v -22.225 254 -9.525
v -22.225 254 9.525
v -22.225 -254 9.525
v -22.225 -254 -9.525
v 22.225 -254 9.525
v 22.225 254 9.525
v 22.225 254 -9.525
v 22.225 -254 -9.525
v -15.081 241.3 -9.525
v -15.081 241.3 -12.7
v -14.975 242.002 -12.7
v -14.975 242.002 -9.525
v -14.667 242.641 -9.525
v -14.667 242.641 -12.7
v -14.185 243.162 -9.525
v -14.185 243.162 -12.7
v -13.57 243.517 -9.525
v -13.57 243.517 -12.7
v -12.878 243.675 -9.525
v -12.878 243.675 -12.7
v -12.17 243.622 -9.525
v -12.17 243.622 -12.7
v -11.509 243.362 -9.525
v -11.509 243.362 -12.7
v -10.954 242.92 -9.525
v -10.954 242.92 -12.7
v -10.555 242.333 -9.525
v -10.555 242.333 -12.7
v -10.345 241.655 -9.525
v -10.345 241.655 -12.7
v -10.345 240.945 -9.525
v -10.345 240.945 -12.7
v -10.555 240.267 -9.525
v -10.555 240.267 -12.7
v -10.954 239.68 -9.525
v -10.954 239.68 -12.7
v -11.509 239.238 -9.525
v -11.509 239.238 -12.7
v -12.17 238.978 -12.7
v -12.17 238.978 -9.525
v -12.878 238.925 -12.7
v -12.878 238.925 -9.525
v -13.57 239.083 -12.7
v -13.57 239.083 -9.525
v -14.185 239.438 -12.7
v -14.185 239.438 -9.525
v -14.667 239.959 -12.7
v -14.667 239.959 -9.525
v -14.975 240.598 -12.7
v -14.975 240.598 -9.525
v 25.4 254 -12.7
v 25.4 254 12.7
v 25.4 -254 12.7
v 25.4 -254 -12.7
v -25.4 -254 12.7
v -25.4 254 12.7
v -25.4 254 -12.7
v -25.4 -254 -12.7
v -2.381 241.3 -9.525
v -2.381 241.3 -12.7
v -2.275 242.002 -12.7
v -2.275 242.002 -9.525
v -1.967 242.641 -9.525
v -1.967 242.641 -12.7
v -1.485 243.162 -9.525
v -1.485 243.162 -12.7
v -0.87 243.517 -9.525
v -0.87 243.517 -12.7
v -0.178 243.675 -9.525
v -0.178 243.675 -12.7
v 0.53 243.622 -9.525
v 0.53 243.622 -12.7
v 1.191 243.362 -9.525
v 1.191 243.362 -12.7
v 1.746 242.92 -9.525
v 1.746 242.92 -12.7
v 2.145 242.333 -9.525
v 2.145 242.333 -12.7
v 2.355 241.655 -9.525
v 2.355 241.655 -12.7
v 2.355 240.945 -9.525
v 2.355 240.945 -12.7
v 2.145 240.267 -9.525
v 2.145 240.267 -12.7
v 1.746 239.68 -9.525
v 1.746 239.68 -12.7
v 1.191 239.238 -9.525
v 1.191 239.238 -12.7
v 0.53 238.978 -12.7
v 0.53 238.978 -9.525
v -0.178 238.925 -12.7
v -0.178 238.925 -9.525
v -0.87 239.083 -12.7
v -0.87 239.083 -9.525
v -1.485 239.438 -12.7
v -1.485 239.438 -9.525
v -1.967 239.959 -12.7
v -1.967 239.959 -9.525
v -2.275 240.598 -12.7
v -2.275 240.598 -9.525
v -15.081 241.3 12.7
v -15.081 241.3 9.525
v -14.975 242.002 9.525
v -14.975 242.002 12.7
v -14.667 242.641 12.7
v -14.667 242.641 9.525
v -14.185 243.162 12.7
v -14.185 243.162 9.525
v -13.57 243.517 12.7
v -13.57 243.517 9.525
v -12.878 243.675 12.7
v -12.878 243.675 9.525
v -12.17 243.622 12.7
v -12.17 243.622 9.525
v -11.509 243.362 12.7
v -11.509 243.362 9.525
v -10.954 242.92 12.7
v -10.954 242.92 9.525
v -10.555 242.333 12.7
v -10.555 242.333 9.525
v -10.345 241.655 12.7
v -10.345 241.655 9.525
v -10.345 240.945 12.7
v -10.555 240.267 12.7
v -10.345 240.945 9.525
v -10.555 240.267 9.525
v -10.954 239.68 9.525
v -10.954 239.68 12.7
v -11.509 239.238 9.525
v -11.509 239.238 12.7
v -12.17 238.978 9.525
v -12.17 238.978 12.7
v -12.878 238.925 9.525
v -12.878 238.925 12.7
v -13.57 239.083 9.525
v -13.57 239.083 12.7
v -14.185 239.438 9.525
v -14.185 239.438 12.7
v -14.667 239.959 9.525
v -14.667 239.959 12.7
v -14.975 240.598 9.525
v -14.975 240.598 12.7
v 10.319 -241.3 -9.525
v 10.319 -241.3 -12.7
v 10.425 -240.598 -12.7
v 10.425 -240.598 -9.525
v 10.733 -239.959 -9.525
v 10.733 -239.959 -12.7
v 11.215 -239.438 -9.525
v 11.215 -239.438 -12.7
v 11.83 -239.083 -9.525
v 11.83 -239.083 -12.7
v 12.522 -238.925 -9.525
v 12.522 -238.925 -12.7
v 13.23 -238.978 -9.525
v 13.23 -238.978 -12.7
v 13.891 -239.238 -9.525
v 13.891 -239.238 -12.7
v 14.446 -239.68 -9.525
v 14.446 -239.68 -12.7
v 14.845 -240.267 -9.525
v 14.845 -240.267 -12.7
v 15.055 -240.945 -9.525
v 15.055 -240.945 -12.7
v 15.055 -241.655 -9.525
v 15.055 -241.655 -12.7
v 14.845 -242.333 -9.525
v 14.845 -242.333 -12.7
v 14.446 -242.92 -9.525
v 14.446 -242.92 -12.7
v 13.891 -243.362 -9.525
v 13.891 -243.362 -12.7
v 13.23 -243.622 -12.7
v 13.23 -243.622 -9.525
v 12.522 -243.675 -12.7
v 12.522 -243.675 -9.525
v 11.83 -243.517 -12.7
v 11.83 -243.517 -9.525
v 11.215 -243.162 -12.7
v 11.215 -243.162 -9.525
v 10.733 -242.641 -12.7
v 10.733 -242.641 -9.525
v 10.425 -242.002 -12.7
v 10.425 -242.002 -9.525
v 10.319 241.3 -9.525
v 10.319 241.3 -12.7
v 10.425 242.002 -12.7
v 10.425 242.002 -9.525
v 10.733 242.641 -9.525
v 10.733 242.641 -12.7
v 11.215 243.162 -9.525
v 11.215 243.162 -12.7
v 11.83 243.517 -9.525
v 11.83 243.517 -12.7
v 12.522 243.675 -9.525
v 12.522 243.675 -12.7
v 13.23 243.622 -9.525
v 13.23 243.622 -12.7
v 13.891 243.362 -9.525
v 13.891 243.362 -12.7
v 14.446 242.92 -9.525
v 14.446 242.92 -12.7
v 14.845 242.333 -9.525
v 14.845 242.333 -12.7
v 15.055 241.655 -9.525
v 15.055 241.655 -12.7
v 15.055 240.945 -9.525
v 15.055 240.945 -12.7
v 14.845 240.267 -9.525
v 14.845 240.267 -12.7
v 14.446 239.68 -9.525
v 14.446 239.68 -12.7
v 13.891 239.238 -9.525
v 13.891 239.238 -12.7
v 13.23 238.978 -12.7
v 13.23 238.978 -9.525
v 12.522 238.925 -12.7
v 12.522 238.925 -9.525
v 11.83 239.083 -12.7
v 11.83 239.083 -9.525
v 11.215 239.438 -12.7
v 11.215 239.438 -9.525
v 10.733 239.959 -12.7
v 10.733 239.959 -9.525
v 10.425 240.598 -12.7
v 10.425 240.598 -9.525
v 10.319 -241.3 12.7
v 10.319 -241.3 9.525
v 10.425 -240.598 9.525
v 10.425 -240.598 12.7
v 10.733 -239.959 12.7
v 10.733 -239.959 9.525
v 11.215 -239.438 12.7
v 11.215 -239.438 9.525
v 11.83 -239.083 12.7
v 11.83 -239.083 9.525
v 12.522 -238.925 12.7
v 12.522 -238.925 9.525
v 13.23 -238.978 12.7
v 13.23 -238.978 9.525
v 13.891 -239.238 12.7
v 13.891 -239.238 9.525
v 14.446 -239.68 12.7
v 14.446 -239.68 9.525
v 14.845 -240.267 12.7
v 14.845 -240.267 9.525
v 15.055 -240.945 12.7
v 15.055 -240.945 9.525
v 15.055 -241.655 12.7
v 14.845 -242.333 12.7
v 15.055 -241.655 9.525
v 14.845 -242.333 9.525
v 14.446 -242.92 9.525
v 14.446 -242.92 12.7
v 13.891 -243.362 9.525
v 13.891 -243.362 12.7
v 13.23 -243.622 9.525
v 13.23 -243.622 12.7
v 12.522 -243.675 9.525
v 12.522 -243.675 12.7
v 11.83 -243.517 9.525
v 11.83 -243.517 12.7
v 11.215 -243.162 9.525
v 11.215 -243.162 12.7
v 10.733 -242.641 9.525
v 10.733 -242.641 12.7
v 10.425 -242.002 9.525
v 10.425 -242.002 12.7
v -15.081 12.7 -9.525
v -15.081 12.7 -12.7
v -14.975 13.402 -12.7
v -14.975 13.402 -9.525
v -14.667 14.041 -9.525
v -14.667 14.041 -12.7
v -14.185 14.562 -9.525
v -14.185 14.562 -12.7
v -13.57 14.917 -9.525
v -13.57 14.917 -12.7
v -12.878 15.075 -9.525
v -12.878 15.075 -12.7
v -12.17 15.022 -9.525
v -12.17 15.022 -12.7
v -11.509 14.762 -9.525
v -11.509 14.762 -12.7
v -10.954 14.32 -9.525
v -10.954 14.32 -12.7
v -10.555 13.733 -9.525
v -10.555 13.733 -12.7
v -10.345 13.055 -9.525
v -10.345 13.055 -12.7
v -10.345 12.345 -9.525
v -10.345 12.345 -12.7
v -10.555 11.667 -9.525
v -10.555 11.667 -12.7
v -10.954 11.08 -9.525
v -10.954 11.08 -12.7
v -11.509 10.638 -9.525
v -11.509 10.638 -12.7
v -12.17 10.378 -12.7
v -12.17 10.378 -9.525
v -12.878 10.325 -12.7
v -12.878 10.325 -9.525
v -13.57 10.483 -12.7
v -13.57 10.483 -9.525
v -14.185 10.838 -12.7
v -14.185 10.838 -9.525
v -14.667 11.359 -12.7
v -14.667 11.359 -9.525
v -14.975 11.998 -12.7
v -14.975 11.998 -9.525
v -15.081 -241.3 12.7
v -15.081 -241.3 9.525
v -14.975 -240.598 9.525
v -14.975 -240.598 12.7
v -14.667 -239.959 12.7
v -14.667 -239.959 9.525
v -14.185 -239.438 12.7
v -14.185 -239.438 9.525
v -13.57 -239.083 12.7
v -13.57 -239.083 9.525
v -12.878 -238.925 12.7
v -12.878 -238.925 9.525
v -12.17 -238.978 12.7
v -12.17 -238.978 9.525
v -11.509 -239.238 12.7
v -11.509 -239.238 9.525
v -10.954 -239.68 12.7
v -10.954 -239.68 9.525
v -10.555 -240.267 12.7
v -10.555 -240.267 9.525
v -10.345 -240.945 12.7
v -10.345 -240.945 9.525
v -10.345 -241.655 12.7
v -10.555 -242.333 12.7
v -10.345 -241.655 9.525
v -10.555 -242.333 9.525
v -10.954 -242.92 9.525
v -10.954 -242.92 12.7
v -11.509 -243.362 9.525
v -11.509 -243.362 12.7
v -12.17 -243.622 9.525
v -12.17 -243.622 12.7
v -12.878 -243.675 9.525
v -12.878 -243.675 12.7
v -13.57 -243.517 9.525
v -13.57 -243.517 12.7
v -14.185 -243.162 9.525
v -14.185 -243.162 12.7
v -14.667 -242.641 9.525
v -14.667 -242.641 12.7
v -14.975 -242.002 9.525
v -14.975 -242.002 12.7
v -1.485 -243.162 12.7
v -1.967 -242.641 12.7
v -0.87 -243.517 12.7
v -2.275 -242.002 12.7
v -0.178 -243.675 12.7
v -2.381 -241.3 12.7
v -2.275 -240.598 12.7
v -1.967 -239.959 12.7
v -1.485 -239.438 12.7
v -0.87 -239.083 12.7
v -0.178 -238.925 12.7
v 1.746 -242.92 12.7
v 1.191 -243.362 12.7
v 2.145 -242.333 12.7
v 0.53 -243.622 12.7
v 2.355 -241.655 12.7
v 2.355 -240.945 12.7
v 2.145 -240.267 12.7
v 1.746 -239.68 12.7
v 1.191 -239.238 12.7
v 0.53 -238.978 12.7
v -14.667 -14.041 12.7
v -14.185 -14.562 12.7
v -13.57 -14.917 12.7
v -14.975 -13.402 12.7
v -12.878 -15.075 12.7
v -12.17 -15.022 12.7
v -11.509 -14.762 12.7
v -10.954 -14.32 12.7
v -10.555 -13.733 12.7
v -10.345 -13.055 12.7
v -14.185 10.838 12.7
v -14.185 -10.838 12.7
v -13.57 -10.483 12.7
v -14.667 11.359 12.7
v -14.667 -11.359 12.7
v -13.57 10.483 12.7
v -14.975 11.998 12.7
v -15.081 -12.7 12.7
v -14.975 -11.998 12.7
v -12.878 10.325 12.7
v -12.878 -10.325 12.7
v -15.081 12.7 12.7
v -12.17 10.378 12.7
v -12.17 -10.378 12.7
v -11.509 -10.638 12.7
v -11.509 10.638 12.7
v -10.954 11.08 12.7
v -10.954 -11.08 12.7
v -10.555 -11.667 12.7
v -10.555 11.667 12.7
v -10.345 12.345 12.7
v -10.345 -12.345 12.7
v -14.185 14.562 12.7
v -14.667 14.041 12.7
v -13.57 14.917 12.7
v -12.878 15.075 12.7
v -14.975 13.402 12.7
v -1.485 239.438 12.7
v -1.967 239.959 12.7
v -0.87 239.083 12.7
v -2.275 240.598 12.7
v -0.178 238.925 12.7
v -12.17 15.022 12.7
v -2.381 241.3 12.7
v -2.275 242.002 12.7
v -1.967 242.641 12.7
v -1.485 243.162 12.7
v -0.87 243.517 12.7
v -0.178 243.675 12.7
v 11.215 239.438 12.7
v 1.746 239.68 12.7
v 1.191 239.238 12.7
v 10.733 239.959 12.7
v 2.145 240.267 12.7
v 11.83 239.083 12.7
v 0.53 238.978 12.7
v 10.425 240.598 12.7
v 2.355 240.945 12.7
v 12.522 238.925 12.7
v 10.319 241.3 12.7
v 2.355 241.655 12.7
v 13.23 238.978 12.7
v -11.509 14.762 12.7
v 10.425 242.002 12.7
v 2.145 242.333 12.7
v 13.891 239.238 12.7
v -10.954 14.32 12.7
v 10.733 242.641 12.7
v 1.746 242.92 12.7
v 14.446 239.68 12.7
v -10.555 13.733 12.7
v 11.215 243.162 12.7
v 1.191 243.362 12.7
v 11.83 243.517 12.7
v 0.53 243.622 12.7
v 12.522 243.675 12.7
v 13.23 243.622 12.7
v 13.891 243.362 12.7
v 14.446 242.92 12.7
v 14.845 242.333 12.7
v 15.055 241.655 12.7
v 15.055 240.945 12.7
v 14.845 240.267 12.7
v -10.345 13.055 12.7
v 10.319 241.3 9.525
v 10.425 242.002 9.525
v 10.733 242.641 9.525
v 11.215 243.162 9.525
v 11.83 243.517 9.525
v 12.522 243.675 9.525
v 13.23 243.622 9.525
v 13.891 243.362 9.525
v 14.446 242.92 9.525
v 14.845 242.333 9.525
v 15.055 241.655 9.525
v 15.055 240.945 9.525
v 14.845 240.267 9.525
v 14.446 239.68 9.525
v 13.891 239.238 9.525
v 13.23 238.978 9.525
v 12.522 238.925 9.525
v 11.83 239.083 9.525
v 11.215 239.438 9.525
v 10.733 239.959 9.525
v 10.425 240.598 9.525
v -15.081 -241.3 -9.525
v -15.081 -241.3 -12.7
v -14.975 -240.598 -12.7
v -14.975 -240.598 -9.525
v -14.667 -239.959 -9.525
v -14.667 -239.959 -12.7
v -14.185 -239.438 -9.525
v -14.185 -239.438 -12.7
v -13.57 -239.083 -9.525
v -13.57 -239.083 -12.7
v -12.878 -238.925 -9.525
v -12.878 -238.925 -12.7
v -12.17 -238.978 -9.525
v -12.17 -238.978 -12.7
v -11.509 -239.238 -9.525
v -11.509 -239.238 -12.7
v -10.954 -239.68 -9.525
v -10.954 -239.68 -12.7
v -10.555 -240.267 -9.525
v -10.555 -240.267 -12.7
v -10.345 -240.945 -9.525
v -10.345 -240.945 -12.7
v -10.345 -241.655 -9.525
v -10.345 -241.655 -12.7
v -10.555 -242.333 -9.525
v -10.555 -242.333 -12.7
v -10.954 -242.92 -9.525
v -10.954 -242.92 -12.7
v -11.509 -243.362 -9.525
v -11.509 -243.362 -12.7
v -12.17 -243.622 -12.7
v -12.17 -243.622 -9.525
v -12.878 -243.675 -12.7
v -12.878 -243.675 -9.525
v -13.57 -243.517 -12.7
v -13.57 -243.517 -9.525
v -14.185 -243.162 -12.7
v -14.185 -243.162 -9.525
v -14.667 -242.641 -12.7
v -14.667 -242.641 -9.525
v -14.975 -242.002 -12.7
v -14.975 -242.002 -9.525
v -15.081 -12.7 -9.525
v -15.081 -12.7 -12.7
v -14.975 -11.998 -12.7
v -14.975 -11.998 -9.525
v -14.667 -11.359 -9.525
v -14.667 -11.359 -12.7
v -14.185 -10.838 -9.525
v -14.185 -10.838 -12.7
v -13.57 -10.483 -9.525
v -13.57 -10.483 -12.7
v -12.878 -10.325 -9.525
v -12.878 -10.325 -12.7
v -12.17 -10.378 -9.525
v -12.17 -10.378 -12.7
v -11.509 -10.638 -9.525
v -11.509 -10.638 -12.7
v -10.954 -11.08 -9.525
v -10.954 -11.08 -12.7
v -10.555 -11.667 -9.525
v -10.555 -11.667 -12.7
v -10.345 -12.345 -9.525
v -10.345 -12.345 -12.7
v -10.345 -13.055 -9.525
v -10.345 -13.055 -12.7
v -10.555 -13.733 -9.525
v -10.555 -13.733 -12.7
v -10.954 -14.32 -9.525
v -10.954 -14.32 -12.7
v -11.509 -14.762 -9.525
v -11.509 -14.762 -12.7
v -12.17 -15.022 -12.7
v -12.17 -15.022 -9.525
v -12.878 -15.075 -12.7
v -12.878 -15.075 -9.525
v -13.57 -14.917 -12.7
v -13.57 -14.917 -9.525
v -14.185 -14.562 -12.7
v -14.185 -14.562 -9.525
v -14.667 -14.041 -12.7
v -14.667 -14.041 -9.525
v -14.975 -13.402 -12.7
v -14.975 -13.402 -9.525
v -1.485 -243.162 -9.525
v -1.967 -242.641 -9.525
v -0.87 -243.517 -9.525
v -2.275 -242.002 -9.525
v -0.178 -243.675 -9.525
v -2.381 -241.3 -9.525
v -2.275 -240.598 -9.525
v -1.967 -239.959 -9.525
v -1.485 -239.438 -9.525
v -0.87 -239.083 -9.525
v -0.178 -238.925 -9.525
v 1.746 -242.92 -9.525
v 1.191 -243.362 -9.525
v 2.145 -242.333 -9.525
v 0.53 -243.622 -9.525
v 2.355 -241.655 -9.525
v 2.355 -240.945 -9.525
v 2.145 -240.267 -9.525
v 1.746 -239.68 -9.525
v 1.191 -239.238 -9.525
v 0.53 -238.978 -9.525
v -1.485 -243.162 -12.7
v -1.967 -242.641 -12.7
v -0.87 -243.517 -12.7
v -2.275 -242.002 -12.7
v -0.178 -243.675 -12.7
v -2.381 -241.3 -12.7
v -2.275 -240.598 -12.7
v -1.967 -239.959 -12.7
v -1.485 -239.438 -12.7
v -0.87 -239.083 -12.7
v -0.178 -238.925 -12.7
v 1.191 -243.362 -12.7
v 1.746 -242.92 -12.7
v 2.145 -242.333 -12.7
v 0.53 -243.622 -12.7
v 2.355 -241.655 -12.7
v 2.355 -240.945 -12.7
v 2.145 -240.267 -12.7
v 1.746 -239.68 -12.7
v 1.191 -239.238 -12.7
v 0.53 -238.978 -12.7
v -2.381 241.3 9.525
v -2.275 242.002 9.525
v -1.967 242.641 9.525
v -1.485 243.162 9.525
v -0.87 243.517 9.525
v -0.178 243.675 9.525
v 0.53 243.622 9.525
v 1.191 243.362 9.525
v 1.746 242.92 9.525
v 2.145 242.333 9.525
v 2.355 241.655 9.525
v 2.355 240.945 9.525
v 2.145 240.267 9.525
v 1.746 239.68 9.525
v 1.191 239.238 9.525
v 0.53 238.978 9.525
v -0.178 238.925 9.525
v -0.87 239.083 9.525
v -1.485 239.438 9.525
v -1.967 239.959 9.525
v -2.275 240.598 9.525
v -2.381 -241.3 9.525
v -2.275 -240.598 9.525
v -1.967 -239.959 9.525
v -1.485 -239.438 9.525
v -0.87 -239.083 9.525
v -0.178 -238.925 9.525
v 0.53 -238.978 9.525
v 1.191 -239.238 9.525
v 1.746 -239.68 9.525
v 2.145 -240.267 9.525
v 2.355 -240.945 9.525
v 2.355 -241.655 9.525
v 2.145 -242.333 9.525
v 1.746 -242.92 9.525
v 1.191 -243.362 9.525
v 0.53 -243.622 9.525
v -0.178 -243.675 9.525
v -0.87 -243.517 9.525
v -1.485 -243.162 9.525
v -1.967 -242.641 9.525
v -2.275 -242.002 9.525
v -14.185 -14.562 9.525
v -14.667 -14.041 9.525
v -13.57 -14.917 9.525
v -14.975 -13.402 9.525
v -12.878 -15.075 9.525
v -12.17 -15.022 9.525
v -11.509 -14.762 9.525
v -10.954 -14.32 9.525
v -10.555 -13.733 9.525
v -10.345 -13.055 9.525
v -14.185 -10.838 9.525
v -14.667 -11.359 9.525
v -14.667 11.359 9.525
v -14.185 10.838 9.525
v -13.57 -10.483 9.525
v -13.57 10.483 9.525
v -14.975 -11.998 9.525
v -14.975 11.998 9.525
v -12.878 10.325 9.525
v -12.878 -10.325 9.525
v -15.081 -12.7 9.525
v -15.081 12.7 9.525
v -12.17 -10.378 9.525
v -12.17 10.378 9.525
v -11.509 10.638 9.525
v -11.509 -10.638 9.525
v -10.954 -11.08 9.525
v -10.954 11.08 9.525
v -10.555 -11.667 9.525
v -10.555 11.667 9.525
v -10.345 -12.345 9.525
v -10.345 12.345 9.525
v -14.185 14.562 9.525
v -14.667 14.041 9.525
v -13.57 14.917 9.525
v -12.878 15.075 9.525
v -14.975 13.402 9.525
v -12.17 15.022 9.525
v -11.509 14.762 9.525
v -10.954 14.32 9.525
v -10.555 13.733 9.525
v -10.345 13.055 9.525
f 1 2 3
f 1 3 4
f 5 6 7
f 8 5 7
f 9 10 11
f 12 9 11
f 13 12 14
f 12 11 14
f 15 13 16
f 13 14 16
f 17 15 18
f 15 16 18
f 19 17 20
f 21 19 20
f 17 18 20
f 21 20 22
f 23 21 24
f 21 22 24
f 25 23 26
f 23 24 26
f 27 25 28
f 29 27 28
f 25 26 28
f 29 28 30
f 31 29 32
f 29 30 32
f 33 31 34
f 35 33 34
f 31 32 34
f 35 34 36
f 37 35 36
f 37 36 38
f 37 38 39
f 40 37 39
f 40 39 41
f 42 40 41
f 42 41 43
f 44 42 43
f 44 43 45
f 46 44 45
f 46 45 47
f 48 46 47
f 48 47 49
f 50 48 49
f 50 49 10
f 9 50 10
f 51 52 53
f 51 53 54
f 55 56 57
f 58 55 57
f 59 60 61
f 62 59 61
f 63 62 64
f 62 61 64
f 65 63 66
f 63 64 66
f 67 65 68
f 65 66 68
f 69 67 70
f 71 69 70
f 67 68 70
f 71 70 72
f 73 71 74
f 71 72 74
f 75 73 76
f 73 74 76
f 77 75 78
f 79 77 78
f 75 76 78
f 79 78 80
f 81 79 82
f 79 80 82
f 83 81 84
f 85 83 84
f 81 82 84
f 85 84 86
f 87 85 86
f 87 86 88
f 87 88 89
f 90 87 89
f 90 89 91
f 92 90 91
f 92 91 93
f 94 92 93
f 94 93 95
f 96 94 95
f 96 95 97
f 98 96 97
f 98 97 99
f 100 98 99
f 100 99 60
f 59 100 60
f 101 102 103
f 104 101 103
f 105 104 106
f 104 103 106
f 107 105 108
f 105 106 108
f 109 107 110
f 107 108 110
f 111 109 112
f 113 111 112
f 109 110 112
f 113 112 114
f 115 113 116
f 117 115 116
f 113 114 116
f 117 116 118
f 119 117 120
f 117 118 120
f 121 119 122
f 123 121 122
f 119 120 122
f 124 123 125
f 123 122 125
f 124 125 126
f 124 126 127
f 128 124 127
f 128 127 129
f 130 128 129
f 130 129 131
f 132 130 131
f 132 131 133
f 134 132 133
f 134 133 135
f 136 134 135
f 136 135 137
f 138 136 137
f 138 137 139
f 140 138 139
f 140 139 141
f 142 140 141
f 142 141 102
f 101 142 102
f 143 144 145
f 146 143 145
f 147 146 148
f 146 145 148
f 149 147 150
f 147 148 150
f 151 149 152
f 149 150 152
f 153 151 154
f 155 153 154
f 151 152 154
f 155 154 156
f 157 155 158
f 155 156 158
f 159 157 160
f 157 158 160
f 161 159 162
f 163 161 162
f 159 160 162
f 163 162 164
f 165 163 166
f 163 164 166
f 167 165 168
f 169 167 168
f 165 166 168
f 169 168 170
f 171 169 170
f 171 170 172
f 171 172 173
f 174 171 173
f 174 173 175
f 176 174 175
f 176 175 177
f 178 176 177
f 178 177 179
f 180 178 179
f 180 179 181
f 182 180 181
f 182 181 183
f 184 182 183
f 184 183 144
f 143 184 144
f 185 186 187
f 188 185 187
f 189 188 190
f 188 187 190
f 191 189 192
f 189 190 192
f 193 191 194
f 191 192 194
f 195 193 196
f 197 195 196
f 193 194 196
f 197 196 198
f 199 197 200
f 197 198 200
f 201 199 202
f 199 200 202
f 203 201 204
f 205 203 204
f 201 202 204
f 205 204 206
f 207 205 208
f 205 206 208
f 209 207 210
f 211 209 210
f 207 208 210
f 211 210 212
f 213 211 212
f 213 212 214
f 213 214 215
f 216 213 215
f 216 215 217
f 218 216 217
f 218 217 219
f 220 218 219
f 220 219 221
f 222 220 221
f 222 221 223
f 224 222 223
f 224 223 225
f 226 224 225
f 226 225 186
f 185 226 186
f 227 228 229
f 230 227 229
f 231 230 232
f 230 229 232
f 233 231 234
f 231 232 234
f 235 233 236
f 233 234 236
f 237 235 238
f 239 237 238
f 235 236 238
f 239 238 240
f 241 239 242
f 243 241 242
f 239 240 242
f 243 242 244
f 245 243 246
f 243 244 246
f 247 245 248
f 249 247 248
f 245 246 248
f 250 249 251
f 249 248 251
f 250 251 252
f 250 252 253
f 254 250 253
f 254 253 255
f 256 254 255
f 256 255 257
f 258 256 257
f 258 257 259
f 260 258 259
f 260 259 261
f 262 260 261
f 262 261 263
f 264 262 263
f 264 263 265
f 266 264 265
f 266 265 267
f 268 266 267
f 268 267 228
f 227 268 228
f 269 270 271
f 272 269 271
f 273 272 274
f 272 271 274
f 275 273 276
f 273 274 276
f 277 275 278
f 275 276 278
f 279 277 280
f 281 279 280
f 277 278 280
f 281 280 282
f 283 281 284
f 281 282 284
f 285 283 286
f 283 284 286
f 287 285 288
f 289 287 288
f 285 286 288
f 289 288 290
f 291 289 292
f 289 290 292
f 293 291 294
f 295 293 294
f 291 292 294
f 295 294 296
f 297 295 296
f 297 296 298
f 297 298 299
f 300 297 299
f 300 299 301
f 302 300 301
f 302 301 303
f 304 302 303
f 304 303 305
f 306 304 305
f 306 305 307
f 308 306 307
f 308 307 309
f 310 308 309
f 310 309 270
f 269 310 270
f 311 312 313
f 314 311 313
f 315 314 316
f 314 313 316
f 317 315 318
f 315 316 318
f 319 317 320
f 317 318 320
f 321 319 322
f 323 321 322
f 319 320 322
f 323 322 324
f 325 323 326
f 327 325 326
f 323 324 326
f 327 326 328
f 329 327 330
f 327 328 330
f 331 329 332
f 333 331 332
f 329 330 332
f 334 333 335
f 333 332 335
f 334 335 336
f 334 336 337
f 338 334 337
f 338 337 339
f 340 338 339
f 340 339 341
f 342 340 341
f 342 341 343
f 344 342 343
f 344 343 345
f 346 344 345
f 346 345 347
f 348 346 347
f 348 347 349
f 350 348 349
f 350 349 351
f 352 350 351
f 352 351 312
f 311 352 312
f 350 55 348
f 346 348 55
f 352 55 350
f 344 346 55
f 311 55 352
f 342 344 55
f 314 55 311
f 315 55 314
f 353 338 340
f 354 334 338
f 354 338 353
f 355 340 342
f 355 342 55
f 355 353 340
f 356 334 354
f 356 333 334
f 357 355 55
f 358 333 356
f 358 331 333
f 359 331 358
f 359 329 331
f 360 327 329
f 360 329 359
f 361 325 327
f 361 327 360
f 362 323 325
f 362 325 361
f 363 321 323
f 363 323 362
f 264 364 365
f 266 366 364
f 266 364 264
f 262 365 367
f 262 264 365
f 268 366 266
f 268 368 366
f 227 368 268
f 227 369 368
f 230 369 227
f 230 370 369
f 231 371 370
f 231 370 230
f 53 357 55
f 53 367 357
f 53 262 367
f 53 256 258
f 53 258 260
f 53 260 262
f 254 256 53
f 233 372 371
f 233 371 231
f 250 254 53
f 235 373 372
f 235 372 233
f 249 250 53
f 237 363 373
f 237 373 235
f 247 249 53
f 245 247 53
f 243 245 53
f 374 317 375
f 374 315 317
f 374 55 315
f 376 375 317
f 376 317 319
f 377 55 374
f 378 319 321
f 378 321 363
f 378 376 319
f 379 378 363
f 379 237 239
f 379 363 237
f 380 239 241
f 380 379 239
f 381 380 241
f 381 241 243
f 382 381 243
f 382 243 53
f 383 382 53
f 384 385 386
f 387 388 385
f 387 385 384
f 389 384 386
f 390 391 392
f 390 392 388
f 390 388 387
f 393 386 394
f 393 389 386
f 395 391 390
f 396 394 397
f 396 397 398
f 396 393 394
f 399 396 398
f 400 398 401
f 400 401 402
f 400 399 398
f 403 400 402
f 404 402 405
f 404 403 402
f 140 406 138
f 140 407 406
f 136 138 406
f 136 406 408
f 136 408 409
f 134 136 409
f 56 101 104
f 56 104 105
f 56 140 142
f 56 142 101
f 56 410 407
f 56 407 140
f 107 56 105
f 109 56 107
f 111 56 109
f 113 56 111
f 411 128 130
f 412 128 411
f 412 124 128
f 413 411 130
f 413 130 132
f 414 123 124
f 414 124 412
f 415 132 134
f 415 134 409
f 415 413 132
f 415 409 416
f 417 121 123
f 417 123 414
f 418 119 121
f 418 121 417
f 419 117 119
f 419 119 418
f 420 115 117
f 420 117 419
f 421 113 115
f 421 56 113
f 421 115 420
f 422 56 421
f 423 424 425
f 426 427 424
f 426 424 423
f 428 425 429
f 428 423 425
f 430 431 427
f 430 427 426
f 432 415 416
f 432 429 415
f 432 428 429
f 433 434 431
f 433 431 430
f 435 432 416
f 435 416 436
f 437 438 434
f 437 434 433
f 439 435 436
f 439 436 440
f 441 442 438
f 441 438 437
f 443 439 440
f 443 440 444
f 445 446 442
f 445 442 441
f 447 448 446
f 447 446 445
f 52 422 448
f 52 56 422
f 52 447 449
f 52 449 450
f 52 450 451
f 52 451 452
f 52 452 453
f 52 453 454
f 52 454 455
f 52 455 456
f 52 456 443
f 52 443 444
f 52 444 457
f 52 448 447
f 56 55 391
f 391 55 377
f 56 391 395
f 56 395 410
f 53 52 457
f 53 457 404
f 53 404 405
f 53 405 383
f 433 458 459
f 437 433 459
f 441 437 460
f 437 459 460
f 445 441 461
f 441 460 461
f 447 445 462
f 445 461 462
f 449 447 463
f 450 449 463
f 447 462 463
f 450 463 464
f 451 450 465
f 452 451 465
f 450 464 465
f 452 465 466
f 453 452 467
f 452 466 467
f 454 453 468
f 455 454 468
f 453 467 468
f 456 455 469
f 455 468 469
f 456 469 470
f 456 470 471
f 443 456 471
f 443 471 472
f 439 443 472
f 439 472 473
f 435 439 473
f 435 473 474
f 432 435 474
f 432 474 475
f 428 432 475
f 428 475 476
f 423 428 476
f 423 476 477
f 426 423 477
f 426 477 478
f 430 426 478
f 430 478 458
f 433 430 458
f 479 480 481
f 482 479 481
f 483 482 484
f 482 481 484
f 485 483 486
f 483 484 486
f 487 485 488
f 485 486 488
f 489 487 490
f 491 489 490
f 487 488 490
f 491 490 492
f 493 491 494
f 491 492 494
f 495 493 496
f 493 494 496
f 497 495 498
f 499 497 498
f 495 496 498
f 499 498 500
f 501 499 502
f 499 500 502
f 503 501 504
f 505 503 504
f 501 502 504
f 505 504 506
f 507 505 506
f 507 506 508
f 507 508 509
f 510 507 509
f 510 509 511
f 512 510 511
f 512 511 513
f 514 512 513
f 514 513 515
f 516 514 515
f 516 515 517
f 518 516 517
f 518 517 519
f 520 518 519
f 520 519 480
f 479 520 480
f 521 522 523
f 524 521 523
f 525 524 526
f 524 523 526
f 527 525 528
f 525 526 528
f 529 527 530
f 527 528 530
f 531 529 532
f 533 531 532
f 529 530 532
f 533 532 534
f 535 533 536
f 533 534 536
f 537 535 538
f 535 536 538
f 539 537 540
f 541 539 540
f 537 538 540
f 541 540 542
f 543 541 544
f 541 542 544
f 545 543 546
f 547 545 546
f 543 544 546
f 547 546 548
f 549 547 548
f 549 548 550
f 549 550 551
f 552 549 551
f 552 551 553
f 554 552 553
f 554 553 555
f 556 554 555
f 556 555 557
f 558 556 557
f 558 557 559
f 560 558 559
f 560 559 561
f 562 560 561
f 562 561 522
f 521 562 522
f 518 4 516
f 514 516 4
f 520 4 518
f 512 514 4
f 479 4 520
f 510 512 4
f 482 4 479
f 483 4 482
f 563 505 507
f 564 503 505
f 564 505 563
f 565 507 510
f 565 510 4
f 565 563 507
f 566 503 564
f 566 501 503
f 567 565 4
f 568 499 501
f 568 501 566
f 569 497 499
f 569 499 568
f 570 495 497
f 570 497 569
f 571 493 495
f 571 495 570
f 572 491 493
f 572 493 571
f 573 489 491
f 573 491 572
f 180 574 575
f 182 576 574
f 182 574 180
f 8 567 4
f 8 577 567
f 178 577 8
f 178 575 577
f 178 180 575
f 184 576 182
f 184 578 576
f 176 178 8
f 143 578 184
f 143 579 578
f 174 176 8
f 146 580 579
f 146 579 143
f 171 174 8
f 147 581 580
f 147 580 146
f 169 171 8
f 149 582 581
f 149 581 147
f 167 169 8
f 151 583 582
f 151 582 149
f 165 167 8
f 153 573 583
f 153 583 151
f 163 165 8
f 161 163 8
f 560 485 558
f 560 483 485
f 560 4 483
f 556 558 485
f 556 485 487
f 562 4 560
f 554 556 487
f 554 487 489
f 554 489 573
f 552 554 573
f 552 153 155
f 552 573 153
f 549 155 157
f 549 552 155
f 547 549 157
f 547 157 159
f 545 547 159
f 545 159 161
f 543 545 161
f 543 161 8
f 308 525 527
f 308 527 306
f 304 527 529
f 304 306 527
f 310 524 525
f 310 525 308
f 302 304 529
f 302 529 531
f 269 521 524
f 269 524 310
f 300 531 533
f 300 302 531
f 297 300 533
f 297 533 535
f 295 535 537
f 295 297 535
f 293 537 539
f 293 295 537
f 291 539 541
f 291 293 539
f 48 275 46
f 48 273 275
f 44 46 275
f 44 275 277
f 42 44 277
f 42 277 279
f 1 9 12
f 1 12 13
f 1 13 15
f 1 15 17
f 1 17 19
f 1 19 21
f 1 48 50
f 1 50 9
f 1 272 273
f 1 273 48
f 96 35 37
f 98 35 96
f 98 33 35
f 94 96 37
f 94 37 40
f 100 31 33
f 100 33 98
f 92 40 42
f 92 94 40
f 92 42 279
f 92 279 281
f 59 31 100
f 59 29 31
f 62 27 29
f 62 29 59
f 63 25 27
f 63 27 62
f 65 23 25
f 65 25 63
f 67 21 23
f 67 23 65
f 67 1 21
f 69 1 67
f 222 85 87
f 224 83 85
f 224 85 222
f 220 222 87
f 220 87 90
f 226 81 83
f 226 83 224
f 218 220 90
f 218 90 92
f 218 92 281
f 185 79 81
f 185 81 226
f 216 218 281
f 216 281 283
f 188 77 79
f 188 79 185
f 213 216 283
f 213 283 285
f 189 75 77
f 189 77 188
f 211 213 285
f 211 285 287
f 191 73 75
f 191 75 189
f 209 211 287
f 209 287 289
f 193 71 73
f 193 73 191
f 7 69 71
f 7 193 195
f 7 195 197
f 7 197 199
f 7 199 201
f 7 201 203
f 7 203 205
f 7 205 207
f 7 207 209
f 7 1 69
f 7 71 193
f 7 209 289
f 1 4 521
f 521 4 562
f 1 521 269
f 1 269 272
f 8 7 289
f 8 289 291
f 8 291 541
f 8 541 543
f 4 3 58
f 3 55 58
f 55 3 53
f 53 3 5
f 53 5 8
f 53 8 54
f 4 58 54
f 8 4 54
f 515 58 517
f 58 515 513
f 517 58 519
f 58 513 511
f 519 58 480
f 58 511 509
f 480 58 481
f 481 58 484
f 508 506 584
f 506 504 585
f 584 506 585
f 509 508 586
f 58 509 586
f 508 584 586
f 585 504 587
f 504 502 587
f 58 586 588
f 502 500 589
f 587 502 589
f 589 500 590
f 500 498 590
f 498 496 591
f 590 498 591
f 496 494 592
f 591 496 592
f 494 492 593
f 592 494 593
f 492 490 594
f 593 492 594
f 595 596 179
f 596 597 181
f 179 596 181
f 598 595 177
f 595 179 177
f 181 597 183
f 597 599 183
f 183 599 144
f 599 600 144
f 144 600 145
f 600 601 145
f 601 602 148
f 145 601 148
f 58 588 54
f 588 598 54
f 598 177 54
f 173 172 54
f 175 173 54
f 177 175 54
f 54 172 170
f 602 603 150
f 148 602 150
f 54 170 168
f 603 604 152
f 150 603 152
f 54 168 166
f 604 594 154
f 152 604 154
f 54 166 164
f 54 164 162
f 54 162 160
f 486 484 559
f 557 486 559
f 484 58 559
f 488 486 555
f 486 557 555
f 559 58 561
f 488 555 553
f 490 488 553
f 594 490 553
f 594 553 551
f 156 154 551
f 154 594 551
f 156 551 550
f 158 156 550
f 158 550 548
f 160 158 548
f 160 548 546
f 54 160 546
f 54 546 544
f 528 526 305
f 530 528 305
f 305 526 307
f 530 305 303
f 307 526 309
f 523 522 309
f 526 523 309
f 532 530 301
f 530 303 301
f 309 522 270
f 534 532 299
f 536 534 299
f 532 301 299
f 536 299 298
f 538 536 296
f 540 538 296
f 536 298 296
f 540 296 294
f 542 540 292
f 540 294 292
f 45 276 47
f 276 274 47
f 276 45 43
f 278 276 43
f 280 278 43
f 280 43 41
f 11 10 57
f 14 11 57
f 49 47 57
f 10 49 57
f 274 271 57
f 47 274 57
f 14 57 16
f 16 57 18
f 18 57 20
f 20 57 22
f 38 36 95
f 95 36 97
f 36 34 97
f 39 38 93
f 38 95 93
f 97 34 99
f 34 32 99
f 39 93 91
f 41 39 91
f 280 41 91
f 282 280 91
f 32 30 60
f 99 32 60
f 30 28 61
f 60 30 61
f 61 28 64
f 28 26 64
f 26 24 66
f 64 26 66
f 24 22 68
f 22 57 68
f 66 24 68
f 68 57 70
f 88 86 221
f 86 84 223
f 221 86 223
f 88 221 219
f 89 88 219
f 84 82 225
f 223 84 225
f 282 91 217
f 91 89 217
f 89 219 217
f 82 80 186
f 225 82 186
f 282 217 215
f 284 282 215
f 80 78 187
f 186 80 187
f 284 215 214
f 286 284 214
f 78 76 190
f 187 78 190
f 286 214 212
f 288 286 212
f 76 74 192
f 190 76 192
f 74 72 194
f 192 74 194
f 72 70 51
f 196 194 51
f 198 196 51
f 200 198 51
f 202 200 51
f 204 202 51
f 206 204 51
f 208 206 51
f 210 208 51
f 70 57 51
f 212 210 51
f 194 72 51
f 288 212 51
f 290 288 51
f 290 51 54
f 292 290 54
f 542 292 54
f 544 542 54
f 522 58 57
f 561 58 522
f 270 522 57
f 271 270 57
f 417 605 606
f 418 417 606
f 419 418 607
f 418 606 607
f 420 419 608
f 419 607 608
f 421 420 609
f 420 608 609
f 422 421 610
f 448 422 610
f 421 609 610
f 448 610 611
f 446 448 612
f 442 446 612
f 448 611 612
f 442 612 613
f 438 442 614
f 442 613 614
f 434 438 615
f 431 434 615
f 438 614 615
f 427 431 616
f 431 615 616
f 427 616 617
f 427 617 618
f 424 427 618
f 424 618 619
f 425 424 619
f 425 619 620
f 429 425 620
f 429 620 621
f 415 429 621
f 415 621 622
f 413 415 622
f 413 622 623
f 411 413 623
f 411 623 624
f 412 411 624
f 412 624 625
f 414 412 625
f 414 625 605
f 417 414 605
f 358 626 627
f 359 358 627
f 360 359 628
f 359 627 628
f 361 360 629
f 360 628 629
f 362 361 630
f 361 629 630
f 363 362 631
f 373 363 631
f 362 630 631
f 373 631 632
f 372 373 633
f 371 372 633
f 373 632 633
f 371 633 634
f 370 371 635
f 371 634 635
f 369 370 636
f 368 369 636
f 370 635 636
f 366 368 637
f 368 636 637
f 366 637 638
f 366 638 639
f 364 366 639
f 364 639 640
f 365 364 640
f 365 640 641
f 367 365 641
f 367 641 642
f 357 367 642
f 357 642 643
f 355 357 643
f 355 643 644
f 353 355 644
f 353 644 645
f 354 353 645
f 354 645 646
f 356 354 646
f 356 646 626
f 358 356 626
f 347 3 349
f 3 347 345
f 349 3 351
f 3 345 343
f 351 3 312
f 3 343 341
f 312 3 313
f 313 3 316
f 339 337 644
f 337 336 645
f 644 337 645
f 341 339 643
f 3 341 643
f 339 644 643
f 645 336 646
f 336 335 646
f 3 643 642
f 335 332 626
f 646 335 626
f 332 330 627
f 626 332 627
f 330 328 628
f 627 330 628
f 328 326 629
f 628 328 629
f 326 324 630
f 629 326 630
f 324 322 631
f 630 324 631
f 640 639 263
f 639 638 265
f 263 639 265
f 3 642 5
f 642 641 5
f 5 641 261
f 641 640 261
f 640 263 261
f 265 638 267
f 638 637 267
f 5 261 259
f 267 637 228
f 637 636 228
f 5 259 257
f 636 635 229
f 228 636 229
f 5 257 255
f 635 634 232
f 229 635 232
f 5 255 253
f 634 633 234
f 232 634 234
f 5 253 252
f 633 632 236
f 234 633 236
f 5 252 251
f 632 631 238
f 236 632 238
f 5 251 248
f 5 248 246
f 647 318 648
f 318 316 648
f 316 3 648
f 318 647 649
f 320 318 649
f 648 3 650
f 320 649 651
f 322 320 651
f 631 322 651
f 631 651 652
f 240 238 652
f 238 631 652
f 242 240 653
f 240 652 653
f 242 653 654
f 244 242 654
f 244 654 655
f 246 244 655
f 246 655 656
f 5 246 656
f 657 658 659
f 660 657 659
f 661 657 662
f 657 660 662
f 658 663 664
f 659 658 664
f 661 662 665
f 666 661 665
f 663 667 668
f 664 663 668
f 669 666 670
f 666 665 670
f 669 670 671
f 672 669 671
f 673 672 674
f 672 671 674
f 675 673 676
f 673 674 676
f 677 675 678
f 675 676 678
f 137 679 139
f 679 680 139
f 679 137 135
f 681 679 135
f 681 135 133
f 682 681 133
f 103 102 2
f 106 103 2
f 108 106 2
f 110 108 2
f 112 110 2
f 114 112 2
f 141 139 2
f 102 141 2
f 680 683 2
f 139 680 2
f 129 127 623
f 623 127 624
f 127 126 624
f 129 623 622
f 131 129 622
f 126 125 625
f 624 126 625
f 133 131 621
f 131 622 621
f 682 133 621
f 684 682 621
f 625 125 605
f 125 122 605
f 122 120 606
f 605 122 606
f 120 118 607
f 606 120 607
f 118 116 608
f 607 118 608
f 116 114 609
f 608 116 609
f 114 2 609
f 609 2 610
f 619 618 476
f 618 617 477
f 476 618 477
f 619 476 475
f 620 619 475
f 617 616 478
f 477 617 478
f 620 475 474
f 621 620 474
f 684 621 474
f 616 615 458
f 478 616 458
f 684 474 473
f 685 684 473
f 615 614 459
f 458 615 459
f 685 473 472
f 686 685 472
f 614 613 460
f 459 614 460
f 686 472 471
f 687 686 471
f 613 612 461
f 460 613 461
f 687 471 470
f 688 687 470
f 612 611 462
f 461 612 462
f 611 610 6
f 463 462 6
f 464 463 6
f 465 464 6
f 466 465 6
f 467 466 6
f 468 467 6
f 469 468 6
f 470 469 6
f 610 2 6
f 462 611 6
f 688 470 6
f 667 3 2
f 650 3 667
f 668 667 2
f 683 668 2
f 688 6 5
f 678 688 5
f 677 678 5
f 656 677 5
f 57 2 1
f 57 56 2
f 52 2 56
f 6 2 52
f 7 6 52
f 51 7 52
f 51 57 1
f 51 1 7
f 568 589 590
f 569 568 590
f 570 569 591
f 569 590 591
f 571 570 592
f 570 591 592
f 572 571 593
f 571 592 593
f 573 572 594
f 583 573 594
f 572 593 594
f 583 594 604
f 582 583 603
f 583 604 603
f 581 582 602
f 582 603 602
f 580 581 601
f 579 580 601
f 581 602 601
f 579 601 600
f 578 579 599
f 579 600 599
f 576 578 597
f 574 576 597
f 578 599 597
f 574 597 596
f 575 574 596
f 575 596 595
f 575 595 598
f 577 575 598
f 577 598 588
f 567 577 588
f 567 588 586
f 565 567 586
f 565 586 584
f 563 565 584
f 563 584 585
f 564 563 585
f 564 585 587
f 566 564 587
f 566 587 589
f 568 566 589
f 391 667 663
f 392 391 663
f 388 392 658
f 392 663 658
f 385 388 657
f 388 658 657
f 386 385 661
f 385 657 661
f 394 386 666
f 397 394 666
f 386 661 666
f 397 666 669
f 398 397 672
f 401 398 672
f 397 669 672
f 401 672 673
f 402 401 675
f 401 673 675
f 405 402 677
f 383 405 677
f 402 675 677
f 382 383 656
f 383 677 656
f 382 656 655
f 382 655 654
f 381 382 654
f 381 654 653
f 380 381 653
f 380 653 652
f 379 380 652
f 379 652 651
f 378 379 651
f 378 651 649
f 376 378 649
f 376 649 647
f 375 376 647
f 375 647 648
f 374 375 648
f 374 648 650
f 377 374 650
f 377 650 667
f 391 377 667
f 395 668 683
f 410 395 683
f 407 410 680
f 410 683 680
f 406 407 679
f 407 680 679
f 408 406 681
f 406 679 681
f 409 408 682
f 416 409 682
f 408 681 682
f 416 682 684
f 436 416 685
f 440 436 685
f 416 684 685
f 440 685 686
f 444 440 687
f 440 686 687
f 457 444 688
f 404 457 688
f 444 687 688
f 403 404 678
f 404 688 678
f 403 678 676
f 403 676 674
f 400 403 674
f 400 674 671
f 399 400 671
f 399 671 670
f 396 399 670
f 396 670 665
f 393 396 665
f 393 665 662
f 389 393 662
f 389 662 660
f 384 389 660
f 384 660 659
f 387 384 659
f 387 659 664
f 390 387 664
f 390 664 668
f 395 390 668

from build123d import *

# Parameters (mm, degrees)
SKETCH1_W           = 50.8
SKETCH1_H           = 25.4
BOSS_EXTRUDE1_DEPTH = 254
SHELL1_T            = -3.175
SKETCH2_R           = 2.38125
CUT_EXTRUDE1_DEPTH  = 257.527425434
SKETCH3_R           = 2.38125
CUT_EXTRUDE2_DEPTH  = 257.527425434


with BuildPart() as part:
    # Sketch1 → Boss-Extrude1 (new, symmetric)
    with BuildSketch(Plane(origin=(0, 0, 0), x_dir=(1, 0, 0), z_dir=(0, 1, 0))):
        Rectangle(SKETCH1_W, SKETCH1_H)
    extrude(amount=BOSS_EXTRUDE1_DEPTH, both=True)

    # Shell1
    shell1_openings = [part.faces().sort_by_distance(p)[0] for p in [
        (0, 254, 0),
        (0, -254, 0),
    ]]
    offset(amount=SHELL1_T, openings=shell1_openings, kind=Kind.INTERSECTION)

    # Sketch2 → Cut-Extrude1 (cut, through all)
    with BuildSketch(Plane(origin=(0, 0, -12.7), x_dir=(-1, 0, 0), z_dir=(0, 0, -1))):
        with Locations((12.7, -12.7)):
            Circle(SKETCH2_R)
        with Locations((12.7, 12.7)):
            Circle(SKETCH2_R)
    extrude(amount=-CUT_EXTRUDE1_DEPTH, mode=Mode.SUBTRACT)

    # Sketch3 → Cut-Extrude2 (cut, through all)
    with BuildSketch(Plane(origin=(0, 0, -12.7), x_dir=(-1, 0, 0), z_dir=(0, 0, -1))):
        with Locations((0, -241.3)):
            Circle(SKETCH3_R)
        with Locations((12.7, -241.3)):
            Circle(SKETCH3_R)
        with Locations((-12.7, -241.3)):
            Circle(SKETCH3_R)
        with Locations((-12.7, 241.3)):
            Circle(SKETCH3_R)
        with Locations((12.7, 241.3)):
            Circle(SKETCH3_R)
        with Locations((0, 241.3)):
            Circle(SKETCH3_R)
    extrude(amount=-CUT_EXTRUDE2_DEPTH, mode=Mode.SUBTRACT)


solid = part.part
